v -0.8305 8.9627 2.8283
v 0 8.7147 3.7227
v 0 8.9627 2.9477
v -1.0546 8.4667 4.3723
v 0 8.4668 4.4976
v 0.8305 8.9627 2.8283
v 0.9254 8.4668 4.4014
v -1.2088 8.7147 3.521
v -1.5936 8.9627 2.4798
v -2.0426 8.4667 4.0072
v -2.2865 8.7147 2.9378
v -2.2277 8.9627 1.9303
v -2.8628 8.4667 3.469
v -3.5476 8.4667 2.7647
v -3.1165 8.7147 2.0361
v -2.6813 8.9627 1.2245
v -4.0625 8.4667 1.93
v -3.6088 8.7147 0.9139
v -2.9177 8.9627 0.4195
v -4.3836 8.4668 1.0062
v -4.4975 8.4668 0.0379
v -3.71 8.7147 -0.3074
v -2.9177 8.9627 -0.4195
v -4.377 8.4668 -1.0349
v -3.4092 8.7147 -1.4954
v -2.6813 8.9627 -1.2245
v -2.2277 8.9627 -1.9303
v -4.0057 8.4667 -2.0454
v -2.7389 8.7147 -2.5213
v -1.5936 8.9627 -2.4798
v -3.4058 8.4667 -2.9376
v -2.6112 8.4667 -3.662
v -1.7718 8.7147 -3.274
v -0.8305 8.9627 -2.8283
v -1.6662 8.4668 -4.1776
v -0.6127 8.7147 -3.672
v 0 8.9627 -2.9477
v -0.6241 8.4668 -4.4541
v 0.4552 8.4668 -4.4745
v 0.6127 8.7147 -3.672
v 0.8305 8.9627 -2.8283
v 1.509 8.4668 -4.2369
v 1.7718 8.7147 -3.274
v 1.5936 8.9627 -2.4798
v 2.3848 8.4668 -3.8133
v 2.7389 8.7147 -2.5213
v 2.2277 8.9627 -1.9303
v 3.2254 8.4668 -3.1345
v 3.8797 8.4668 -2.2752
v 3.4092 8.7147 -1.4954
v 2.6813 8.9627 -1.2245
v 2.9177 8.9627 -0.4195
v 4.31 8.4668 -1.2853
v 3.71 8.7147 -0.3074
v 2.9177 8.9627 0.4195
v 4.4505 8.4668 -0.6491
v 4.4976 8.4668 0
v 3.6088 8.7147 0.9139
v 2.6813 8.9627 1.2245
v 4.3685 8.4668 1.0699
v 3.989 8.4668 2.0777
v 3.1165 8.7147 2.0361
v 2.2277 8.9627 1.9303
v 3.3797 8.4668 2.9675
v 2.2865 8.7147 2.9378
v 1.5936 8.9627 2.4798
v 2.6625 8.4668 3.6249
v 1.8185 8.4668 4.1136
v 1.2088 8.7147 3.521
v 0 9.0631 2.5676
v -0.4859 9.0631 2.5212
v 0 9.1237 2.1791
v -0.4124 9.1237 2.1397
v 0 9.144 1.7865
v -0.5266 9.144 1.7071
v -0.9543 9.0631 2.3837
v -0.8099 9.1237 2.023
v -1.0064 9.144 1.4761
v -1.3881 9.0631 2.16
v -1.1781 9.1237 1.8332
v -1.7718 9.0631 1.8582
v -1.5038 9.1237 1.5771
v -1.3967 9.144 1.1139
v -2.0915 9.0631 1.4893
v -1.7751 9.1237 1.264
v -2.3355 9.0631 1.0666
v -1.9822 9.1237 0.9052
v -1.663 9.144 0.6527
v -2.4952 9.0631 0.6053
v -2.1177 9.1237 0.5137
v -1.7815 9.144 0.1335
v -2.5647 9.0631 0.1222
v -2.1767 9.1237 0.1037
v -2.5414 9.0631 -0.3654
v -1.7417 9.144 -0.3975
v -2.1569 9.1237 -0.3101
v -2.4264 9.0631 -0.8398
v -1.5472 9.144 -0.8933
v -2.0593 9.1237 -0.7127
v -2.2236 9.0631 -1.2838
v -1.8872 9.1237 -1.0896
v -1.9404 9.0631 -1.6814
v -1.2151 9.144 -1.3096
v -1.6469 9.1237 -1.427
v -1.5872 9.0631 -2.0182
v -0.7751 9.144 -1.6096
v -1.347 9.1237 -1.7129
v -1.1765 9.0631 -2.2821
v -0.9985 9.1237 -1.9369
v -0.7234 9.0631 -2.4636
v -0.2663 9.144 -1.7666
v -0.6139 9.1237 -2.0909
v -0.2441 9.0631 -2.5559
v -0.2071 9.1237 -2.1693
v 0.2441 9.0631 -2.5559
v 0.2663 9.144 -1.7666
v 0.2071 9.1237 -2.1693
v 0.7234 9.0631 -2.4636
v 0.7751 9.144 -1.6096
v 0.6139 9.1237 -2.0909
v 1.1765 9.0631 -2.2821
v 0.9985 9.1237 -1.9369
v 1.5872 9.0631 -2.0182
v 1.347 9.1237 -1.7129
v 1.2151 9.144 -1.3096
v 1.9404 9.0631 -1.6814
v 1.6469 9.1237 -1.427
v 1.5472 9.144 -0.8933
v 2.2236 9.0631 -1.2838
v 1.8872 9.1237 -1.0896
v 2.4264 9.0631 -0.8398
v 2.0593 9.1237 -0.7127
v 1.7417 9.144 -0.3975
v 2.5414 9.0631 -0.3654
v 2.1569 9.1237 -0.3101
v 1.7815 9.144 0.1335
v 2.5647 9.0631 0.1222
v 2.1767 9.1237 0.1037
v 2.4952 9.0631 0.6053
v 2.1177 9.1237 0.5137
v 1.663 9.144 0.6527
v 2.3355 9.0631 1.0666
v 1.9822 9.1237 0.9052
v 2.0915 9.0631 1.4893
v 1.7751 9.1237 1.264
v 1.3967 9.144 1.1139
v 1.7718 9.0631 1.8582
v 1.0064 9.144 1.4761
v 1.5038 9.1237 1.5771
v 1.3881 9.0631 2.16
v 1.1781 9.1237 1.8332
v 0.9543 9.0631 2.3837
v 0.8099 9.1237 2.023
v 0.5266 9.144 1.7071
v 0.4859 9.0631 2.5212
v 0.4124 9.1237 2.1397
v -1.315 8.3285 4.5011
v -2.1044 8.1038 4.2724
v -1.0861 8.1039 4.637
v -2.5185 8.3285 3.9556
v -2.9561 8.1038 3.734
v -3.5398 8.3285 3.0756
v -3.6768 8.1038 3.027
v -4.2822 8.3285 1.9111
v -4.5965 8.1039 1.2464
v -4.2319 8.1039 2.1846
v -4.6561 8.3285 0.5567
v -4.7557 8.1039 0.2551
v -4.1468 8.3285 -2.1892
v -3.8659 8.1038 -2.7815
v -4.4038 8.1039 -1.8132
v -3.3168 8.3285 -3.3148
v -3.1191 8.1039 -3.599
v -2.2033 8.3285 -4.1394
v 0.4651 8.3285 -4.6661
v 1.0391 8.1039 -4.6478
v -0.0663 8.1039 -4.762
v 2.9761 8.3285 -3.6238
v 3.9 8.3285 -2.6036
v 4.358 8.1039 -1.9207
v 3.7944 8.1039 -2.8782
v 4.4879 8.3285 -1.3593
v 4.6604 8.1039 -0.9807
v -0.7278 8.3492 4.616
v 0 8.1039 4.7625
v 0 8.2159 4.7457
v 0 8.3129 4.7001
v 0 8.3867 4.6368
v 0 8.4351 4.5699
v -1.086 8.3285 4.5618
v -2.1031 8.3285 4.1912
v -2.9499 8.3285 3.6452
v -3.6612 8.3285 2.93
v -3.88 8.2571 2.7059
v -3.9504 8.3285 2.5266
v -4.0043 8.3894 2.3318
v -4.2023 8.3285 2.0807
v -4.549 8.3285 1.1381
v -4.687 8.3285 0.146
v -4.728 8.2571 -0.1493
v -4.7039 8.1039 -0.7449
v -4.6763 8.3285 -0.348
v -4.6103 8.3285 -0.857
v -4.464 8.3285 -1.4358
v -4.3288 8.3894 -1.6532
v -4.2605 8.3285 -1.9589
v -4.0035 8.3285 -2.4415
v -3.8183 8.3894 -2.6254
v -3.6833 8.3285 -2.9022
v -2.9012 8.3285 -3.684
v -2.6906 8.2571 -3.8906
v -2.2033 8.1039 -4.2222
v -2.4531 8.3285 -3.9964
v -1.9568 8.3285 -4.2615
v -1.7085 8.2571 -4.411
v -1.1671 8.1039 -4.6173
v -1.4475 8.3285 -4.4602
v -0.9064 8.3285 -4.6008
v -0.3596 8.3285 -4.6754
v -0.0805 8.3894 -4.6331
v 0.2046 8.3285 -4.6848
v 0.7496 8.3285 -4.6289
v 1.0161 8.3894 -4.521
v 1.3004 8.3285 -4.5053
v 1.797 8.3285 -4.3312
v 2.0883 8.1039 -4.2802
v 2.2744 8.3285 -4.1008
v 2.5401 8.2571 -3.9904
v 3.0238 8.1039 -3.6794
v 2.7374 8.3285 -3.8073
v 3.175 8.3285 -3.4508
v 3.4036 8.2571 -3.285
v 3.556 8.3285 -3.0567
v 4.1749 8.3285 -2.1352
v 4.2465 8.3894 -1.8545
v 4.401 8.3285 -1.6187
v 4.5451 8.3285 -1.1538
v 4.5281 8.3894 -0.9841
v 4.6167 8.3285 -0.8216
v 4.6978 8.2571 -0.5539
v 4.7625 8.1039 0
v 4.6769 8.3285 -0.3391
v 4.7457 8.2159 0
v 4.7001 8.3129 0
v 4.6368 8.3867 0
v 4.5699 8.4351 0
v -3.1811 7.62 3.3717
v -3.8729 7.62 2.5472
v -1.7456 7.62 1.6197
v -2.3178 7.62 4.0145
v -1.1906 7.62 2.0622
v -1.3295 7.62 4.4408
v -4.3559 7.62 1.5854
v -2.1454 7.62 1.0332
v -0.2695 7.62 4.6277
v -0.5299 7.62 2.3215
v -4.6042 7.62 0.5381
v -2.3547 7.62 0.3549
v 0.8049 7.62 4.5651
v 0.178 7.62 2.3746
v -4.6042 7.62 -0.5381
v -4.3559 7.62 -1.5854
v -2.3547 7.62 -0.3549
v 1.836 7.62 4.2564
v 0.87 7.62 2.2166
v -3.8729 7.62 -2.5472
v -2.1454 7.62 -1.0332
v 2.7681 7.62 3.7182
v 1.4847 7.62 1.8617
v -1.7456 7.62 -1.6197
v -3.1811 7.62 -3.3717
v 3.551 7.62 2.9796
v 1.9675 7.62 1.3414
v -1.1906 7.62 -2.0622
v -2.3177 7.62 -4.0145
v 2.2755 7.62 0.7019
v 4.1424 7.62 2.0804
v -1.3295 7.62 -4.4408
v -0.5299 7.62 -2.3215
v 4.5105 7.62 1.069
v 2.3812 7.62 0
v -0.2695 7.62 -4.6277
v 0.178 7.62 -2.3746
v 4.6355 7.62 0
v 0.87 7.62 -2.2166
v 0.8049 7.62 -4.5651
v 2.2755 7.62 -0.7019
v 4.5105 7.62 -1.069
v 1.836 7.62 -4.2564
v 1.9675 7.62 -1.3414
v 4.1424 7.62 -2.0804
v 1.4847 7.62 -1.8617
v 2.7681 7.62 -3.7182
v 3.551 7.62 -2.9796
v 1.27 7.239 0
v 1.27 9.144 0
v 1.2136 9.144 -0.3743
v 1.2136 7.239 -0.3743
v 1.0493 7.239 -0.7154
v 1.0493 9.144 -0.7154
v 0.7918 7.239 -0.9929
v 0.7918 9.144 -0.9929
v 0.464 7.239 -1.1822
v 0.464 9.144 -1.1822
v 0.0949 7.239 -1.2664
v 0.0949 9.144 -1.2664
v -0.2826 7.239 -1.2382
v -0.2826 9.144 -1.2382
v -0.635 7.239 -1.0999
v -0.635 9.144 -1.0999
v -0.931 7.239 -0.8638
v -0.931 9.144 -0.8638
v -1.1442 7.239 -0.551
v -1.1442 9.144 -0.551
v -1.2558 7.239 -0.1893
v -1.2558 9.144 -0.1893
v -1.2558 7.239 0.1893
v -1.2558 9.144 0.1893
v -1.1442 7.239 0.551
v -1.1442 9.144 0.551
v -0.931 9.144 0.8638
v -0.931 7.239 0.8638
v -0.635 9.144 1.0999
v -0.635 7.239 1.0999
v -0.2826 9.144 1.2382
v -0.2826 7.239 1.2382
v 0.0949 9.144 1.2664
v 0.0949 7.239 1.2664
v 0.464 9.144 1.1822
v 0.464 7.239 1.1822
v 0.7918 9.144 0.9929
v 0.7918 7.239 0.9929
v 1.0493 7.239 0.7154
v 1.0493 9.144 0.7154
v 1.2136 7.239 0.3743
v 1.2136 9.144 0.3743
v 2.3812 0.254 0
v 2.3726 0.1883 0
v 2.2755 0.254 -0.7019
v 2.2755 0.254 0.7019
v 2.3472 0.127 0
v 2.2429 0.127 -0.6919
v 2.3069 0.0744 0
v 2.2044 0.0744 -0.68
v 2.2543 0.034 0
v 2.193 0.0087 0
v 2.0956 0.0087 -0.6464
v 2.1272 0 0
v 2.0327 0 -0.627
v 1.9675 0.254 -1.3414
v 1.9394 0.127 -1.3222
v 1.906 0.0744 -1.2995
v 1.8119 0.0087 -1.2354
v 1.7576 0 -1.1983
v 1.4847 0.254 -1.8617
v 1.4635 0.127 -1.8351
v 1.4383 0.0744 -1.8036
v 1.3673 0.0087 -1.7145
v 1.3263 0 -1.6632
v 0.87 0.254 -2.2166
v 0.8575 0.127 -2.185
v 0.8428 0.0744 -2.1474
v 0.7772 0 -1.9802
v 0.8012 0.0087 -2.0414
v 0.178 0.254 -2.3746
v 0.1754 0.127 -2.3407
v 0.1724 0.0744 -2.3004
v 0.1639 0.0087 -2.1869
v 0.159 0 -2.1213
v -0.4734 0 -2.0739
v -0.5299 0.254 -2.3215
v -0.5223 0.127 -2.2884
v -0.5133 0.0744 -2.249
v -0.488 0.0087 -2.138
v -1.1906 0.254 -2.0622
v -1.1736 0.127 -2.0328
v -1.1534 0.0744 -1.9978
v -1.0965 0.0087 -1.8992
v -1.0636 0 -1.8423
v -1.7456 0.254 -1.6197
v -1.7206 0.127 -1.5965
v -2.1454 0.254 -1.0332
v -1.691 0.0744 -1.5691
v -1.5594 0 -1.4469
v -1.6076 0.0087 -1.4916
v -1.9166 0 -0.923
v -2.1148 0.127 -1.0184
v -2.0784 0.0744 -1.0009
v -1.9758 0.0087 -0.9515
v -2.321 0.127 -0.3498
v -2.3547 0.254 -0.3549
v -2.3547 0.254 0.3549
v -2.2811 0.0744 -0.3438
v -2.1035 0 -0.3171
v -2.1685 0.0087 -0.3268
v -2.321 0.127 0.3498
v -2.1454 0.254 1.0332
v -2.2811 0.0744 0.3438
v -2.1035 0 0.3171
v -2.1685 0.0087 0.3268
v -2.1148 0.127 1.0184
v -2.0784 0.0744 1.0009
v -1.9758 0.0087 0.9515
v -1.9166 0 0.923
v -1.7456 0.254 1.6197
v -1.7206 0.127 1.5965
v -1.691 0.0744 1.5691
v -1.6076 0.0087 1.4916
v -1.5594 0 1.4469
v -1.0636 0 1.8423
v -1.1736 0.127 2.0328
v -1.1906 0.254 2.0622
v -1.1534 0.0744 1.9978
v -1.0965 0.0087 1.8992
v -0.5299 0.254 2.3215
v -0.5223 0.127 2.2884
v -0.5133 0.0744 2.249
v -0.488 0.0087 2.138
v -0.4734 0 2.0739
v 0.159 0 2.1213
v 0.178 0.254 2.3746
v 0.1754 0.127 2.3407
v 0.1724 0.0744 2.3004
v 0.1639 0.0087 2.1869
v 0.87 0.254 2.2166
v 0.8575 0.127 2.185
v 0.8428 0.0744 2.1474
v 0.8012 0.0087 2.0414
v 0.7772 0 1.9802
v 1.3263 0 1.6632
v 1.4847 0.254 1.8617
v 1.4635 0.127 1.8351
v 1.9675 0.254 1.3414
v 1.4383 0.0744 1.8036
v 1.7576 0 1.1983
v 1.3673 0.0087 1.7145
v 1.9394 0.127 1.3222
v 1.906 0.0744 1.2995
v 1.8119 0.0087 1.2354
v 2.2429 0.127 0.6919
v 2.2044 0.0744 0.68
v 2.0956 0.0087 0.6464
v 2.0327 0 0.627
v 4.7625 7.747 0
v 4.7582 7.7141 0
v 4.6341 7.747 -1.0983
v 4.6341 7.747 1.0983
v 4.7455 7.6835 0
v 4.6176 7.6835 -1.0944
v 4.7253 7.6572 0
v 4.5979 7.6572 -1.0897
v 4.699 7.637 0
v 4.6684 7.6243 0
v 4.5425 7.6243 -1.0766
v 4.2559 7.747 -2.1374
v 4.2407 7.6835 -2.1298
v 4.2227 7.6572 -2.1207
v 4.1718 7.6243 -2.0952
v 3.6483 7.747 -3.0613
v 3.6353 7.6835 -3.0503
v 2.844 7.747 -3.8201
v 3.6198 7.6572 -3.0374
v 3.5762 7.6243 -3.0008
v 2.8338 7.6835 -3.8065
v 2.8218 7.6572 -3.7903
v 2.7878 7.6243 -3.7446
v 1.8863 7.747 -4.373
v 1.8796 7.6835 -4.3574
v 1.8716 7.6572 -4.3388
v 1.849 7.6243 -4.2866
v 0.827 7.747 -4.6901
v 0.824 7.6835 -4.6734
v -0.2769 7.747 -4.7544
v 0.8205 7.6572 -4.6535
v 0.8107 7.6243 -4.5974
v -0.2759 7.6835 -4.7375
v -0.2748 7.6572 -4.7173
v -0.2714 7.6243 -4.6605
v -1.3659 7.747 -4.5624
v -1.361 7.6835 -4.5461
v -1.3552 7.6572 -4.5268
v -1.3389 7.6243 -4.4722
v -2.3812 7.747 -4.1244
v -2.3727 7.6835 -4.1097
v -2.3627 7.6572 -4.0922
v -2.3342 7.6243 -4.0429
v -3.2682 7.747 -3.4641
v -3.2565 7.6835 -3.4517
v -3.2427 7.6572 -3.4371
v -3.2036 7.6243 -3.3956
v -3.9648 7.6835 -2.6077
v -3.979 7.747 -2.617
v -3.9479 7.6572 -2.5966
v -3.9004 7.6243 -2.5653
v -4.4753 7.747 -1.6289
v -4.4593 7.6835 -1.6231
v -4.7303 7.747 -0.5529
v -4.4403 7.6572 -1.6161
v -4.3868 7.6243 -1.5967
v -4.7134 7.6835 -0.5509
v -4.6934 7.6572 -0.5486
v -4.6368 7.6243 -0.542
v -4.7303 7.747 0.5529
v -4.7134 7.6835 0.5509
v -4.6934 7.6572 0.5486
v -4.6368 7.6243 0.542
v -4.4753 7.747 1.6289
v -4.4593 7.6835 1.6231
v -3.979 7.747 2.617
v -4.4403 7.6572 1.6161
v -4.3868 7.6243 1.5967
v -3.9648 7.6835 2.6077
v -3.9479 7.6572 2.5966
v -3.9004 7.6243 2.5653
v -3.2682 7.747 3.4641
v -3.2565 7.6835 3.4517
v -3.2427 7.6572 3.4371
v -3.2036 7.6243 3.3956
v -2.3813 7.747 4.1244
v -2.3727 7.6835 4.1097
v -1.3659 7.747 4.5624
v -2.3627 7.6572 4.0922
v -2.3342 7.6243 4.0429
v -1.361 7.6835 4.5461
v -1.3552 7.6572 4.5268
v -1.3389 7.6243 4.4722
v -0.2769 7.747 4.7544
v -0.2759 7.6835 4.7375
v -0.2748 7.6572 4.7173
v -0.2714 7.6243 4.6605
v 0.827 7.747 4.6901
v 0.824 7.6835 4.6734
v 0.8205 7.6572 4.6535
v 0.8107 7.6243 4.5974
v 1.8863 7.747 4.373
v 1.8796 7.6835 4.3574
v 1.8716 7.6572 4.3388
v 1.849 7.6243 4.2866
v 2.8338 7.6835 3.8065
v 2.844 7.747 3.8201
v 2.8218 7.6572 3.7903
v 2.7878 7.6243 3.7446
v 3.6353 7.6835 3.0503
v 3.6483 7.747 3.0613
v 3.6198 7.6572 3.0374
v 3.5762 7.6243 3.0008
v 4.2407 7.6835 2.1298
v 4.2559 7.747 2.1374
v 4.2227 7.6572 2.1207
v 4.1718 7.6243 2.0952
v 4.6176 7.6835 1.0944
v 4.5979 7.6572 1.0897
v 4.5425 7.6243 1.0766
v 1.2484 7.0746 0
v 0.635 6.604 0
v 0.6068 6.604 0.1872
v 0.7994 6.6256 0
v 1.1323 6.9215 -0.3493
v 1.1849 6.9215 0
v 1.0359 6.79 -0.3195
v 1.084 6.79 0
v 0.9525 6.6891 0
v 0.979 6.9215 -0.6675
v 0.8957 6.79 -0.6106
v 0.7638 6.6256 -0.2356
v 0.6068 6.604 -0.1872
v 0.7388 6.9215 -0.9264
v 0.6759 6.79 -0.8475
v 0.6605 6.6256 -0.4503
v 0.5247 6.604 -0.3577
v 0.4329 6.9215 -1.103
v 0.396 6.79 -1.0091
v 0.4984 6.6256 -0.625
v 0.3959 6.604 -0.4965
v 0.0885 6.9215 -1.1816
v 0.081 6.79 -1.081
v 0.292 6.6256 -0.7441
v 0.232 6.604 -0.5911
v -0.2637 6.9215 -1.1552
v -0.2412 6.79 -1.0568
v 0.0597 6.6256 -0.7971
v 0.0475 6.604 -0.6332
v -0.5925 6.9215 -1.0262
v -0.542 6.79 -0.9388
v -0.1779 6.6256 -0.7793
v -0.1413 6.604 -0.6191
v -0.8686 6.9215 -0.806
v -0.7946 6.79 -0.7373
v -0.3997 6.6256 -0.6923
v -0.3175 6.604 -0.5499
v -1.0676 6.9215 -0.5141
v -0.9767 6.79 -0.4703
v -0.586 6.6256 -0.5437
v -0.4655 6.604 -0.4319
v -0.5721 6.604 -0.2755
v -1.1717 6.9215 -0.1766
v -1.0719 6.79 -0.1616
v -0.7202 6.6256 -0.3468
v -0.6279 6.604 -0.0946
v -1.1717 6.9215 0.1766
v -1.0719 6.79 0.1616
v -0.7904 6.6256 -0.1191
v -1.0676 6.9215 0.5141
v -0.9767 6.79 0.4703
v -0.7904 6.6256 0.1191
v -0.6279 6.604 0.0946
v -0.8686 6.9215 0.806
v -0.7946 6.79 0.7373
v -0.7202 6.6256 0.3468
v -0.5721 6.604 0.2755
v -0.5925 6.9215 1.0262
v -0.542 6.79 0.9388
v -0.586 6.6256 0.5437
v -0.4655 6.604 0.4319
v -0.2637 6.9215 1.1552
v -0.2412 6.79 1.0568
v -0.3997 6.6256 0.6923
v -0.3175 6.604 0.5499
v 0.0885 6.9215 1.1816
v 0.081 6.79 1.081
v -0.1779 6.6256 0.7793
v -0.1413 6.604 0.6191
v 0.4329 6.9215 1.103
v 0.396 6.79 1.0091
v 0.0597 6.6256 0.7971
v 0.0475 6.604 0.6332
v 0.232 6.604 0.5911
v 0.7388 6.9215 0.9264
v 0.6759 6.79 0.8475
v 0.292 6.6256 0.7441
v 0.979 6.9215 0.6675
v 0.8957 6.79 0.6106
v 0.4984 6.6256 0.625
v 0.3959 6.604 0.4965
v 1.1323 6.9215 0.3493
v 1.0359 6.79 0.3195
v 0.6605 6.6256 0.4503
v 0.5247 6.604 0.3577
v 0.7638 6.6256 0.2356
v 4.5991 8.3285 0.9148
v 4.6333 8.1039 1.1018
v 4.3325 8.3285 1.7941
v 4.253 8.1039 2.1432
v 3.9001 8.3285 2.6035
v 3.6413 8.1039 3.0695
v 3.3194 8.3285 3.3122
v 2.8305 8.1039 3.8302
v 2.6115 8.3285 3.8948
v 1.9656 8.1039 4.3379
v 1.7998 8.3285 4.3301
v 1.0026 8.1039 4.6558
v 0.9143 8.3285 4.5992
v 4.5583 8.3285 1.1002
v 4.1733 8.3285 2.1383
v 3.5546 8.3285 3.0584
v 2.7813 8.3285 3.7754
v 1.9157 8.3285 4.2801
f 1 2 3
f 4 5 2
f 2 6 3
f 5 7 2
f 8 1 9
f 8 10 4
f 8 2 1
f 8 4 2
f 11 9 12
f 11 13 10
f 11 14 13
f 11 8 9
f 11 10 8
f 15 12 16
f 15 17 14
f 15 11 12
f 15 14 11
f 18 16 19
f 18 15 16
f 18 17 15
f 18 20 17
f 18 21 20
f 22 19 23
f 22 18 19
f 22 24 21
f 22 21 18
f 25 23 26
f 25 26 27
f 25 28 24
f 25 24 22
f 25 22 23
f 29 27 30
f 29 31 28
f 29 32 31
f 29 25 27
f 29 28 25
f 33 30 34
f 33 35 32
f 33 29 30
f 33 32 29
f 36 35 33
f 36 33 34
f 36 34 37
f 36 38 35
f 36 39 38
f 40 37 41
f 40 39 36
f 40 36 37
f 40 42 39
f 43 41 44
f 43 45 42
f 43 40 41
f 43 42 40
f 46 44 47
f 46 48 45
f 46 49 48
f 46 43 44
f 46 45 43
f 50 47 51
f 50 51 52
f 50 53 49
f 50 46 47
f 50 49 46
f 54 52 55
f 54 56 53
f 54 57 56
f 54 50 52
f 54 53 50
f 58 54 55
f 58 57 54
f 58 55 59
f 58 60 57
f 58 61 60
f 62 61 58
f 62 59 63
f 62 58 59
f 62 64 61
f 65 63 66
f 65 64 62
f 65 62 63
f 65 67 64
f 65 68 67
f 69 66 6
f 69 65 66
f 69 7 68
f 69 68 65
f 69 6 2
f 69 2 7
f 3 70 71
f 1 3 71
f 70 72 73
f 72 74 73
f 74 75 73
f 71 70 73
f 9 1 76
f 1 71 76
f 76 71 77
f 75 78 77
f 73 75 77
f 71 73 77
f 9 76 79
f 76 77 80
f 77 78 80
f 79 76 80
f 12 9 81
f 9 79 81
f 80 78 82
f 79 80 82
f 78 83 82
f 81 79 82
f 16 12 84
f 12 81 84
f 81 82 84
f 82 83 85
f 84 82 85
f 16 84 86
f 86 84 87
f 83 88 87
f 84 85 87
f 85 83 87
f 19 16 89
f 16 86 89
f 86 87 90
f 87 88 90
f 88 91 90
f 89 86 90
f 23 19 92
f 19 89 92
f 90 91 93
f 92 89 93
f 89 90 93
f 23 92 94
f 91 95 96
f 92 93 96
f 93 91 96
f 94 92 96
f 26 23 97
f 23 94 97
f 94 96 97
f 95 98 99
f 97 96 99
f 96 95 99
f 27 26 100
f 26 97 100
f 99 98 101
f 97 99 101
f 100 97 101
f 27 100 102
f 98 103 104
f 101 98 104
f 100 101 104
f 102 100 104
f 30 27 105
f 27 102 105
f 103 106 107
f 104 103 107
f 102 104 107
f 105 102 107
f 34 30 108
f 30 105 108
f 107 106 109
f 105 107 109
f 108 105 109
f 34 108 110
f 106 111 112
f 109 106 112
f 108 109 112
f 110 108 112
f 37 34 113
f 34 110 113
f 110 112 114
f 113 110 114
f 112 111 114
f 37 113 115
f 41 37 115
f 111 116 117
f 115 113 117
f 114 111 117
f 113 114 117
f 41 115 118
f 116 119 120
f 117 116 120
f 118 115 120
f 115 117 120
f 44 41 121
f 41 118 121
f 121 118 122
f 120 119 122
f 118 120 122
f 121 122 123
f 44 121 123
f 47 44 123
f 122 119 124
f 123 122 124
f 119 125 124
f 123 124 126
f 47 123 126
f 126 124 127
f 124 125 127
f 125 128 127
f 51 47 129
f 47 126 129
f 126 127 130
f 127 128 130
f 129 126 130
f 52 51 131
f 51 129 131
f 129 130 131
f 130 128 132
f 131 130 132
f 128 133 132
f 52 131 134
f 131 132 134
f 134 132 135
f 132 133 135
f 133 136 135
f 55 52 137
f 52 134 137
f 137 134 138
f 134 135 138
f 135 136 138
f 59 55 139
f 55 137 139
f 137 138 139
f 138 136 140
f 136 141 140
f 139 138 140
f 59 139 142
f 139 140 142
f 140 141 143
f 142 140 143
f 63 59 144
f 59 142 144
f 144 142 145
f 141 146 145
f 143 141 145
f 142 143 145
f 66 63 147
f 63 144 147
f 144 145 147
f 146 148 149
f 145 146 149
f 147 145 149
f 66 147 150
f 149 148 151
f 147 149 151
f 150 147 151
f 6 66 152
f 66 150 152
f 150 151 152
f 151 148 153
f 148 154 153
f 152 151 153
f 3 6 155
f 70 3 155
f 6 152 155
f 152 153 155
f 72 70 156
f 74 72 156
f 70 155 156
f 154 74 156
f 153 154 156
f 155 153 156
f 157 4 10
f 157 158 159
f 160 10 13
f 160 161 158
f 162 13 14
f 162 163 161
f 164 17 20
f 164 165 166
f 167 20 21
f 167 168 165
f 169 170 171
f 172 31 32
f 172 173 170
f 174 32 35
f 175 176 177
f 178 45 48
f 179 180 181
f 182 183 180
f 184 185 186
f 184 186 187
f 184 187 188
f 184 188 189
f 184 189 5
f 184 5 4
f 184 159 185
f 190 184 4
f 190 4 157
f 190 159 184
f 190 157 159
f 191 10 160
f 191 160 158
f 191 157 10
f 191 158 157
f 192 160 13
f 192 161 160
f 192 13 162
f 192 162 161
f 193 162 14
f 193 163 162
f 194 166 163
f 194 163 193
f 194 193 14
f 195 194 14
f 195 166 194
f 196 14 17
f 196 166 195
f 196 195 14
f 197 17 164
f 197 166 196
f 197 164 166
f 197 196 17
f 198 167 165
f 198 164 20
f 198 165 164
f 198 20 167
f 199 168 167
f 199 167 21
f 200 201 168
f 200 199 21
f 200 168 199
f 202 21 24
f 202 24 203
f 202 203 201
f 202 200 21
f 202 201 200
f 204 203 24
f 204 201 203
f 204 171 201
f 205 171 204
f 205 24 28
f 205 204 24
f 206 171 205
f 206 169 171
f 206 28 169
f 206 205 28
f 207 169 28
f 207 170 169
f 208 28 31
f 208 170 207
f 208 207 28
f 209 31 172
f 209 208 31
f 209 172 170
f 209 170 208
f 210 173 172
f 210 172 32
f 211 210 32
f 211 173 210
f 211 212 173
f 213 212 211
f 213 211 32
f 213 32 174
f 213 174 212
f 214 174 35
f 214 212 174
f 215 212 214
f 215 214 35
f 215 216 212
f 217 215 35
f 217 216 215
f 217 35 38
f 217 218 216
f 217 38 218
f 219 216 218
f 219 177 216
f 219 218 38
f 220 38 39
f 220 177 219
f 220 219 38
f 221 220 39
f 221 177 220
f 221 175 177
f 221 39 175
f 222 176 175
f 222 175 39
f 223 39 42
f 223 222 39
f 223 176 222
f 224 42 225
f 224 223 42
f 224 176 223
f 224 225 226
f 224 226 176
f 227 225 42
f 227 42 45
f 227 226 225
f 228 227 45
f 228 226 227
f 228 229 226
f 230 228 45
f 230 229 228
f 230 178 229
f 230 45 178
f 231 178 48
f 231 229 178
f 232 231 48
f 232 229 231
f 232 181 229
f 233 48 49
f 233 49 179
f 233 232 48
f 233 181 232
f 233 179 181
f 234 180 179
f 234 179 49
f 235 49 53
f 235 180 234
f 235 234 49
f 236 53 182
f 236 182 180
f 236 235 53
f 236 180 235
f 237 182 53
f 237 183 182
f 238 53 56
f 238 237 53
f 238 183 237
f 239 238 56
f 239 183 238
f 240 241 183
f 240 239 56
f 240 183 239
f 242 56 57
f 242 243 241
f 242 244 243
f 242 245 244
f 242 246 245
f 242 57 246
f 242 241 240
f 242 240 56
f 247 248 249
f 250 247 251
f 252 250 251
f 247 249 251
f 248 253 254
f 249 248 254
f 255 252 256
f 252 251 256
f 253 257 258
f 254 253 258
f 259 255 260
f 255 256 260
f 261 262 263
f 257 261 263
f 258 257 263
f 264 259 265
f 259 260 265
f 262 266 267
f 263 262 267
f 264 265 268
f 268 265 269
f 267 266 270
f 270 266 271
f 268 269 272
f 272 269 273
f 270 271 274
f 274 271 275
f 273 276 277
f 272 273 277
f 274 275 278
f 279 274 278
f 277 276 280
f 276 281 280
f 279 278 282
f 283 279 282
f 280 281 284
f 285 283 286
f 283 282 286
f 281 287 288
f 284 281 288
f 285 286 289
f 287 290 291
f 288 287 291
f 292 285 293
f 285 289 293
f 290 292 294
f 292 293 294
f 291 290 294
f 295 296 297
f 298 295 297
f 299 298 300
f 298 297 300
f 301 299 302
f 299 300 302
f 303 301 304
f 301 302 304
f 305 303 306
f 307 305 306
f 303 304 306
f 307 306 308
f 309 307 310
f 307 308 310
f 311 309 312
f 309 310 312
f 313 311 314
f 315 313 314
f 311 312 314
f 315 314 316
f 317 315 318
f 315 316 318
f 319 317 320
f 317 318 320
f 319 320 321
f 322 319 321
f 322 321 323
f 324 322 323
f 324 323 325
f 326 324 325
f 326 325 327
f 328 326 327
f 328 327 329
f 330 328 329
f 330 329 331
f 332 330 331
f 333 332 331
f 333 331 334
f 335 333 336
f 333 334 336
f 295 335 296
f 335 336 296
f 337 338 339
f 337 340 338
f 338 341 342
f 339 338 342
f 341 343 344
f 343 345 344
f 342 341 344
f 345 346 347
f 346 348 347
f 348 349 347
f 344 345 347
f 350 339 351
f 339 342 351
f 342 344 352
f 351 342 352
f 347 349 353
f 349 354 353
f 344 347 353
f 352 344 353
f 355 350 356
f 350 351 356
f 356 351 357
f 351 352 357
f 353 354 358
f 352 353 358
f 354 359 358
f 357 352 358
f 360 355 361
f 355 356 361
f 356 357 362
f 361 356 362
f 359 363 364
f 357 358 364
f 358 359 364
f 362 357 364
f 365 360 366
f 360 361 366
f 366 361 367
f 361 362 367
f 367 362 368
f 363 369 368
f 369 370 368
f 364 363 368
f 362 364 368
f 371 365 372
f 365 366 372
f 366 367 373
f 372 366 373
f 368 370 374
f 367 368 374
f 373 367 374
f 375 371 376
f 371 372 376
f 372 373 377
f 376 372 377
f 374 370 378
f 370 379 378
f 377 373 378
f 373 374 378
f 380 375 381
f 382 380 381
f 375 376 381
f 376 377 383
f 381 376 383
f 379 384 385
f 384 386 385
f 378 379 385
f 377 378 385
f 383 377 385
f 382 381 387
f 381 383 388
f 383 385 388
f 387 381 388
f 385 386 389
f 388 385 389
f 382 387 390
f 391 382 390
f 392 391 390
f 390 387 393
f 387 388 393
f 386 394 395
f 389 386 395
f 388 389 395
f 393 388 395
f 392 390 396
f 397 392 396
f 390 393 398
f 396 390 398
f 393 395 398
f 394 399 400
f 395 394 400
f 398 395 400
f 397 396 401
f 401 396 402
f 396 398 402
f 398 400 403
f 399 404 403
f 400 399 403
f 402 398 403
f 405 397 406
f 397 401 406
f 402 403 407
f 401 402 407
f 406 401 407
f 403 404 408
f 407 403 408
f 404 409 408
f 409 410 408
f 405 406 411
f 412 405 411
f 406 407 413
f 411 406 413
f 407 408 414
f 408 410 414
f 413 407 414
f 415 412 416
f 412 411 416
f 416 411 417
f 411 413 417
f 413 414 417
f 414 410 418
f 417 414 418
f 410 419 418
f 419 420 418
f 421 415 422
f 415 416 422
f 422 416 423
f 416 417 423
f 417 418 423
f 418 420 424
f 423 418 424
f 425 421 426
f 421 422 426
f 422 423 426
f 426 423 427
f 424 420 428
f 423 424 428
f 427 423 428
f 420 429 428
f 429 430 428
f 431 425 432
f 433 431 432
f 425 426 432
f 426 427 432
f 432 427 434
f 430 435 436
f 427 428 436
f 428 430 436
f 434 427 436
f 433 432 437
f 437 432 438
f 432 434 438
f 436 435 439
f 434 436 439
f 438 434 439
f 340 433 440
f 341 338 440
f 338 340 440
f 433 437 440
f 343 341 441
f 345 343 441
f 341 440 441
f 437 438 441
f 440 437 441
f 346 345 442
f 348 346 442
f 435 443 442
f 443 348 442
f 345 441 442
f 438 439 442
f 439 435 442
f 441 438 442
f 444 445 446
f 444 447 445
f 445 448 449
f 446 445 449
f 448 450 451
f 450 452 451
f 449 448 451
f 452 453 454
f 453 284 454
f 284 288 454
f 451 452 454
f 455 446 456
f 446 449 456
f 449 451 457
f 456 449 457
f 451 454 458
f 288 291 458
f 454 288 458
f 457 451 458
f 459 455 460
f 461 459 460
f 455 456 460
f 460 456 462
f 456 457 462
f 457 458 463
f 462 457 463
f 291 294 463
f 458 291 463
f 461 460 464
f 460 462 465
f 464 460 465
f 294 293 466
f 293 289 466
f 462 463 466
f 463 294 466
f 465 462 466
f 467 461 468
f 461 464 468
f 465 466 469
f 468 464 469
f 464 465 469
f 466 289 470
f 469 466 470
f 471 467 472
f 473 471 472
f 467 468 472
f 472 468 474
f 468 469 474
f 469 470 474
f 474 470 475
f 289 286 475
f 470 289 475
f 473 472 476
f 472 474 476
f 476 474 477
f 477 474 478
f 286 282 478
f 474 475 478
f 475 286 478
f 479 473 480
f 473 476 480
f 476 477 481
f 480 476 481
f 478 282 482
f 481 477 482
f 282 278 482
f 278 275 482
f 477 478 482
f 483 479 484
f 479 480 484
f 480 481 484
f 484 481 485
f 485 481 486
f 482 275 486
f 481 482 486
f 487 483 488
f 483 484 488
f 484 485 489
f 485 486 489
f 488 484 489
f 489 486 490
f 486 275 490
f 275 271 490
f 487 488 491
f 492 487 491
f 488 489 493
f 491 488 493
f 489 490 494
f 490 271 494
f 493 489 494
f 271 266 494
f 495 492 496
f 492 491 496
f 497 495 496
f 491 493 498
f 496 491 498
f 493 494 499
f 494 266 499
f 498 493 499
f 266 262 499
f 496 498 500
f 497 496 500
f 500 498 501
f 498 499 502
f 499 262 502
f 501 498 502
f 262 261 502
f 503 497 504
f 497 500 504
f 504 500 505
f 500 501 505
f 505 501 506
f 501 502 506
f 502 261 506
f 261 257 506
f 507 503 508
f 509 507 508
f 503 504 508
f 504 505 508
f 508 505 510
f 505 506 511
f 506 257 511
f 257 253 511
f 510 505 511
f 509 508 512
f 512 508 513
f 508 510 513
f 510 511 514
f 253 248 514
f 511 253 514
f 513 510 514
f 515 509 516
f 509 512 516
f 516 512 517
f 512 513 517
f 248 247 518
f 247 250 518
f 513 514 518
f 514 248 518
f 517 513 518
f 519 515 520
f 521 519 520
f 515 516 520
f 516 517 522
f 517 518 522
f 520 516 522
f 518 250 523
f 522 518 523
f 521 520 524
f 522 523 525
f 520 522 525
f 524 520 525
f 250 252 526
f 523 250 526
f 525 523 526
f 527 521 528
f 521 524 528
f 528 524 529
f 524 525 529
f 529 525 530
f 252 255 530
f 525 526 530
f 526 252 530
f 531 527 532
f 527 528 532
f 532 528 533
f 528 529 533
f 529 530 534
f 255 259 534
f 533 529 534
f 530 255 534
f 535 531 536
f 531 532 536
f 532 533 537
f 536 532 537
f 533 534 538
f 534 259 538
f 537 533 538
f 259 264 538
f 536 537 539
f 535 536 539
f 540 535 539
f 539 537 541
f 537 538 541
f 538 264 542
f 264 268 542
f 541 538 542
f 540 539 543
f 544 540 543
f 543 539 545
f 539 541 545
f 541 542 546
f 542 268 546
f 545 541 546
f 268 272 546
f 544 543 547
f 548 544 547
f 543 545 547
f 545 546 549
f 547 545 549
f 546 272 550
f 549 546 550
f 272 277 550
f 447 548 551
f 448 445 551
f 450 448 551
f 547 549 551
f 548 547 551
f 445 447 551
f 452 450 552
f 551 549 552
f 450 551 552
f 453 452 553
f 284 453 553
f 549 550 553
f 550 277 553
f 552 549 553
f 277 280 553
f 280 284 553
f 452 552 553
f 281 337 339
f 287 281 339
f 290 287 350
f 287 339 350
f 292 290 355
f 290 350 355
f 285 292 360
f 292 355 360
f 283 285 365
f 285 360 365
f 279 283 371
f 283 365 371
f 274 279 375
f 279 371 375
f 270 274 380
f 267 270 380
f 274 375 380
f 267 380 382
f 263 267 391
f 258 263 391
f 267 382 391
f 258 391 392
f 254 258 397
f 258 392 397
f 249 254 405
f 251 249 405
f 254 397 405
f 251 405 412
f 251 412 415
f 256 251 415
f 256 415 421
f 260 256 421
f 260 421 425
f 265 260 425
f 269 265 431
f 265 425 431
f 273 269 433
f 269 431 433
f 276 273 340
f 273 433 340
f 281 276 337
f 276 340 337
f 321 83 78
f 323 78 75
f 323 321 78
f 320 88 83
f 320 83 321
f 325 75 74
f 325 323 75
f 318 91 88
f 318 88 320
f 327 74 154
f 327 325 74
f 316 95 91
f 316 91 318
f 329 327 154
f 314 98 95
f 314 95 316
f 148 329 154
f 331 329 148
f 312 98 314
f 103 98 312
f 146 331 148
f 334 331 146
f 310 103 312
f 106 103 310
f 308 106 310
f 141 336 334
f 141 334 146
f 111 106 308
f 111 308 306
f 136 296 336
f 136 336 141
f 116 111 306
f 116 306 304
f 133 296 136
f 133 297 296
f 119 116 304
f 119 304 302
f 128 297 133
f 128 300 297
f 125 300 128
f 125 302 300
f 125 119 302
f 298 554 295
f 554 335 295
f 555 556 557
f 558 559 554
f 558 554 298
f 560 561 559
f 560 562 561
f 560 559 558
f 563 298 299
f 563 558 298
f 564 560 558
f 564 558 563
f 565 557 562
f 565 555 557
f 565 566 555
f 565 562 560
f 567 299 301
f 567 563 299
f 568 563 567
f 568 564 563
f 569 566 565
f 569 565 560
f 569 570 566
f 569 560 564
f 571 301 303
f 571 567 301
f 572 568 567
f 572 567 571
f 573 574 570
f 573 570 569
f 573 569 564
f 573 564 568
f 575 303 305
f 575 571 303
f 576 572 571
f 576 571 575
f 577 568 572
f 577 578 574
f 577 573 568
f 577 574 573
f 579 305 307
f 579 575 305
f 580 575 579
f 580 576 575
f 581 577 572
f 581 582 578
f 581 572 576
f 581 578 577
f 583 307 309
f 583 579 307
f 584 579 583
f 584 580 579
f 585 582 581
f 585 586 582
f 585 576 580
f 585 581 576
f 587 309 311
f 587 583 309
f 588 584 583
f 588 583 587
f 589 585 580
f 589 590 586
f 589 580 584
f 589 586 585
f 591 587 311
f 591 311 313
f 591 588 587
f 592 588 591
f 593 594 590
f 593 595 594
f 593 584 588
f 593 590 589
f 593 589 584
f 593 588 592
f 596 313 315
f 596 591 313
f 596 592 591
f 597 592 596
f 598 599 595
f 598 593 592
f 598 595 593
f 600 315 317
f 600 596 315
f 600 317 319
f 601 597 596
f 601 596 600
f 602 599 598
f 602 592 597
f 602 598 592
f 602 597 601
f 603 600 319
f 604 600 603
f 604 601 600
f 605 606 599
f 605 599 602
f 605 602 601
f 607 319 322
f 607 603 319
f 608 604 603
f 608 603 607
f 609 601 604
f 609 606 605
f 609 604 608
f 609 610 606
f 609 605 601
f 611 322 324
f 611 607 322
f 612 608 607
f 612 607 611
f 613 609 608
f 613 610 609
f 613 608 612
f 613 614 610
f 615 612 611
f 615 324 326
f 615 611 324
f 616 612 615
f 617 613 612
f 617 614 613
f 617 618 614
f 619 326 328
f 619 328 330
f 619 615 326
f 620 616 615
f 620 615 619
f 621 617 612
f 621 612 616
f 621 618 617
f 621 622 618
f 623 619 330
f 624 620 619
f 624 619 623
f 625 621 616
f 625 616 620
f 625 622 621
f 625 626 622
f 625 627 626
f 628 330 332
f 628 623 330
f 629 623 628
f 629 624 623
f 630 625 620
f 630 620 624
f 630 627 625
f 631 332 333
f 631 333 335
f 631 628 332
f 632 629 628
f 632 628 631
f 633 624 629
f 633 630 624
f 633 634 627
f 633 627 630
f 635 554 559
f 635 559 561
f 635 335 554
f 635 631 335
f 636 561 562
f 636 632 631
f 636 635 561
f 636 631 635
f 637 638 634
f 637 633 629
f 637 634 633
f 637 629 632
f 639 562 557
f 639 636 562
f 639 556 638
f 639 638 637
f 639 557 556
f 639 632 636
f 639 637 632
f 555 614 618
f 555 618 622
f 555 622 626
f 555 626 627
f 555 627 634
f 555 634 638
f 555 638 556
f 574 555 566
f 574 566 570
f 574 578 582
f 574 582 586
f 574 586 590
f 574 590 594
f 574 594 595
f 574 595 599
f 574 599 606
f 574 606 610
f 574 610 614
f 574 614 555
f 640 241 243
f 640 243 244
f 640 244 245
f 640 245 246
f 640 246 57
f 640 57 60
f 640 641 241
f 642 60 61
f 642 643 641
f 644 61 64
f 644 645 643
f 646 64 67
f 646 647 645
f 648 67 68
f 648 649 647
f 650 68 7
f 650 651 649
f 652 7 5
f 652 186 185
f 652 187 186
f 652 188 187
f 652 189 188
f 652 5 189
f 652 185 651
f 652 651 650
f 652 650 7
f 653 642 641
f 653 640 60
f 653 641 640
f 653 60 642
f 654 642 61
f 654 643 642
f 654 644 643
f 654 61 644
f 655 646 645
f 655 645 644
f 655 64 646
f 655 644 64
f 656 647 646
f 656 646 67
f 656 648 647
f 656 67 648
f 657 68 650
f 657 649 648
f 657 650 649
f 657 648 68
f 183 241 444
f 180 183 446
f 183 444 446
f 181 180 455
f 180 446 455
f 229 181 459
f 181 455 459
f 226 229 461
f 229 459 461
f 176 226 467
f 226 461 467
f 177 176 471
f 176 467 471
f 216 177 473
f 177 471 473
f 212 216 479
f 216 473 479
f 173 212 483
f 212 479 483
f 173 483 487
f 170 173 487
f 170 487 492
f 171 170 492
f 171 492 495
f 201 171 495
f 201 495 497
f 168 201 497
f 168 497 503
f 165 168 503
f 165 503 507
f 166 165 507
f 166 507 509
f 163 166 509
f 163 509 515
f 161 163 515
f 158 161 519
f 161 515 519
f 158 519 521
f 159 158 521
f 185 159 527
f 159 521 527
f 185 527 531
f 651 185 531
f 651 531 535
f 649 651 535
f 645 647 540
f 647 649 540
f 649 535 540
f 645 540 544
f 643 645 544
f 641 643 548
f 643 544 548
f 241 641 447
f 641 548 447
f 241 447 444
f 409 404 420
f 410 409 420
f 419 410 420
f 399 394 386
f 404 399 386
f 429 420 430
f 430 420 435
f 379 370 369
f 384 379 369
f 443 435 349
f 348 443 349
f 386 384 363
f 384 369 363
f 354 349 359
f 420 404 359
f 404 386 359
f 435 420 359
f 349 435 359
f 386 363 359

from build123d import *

# Parameters (mm, degrees)
SKETCH1_R           = 2.38125
BOSS_EXTRUDE1_DEPTH = 7.62
SKETCH2_R           = 4.7625
BOSS_EXTRUDE2_DEPTH = 1.524
FILLET1_R           = 0.254
FILLET2_R           = 0.381
FILLET3_R           = 0.127
FILLET4_R           = 3.81
SKETCH4_R           = 1.27
CUT_EXTRUDE1_DEPTH  = 2.54
FILLET5_R           = 0.635


with BuildPart() as part:
    # Sketch1 → Boss-Extrude1 (new body)
    with BuildSketch(Plane(origin=(0, 0, 0), x_dir=(1, 0, 0), z_dir=(0, 1, 0))):
        Circle(SKETCH1_R)
    extrude(amount=BOSS_EXTRUDE1_DEPTH)

    # Sketch2 → Boss-Extrude2 (add)
    with BuildSketch(Plane(origin=(0, 7.62, 0), x_dir=(1, 0, 0), z_dir=(0, 1, 0))):
        Circle(SKETCH2_R)
    extrude(amount=BOSS_EXTRUDE2_DEPTH)

    # Fillet1
    fillet1_edges = [part.edges().sort_by_distance(p)[0] for p in [
        (-2.38125, 0, 0),
    ]]
    fillet(fillet1_edges, radius=FILLET1_R)

    # Sketch3 → Cut-Revolve1 (revolve, cut)
    with BuildSketch(Plane(origin=(0, 0, 0), x_dir=(0, 0, -1), z_dir=(1, 0, 0))):
        Polygon((-2.38125, 9.144), (-4.7625, 8.382), (-4.7625, 9.144), align=None)
    revolve(axis=Axis((0, 9.144, 0), (0, -1, 0)), mode=Mode.SUBTRACT)

    # Fillet2
    fillet2_edges = [part.edges().sort_by_distance(p)[0] for p in [
        (3.367596045, 8.382, 3.367596045),
    ]]
    fillet(fillet2_edges, radius=FILLET2_R)

    # Fillet3
    fillet3_edges = [part.edges().sort_by_distance(p)[0] for p in [
        (-4.7625, 7.62, 0),
    ]]
    fillet(fillet3_edges, radius=FILLET3_R)

    # Fillet4
    fillet4_edges = [part.edges().sort_by_distance(p)[0] for p in [
        (0, 9.144, -2.38125),
    ]]
    fillet(fillet4_edges, radius=FILLET4_R)

    # Sketch4 → Cut-Extrude1 (cut)
    with BuildSketch(Plane(origin=(0, 9.144, 0), x_dir=(1, 0, 0), z_dir=(0, 1, 0))):
        Circle(SKETCH4_R)
    extrude(amount=-CUT_EXTRUDE1_DEPTH, mode=Mode.SUBTRACT)

    # Fillet5
    fillet5_edges = [part.edges().sort_by_distance(p)[0] for p in [
        (-1.27, 6.604, 0),
    ]]
    fillet(fillet5_edges, radius=FILLET5_R)


solid = part.part
